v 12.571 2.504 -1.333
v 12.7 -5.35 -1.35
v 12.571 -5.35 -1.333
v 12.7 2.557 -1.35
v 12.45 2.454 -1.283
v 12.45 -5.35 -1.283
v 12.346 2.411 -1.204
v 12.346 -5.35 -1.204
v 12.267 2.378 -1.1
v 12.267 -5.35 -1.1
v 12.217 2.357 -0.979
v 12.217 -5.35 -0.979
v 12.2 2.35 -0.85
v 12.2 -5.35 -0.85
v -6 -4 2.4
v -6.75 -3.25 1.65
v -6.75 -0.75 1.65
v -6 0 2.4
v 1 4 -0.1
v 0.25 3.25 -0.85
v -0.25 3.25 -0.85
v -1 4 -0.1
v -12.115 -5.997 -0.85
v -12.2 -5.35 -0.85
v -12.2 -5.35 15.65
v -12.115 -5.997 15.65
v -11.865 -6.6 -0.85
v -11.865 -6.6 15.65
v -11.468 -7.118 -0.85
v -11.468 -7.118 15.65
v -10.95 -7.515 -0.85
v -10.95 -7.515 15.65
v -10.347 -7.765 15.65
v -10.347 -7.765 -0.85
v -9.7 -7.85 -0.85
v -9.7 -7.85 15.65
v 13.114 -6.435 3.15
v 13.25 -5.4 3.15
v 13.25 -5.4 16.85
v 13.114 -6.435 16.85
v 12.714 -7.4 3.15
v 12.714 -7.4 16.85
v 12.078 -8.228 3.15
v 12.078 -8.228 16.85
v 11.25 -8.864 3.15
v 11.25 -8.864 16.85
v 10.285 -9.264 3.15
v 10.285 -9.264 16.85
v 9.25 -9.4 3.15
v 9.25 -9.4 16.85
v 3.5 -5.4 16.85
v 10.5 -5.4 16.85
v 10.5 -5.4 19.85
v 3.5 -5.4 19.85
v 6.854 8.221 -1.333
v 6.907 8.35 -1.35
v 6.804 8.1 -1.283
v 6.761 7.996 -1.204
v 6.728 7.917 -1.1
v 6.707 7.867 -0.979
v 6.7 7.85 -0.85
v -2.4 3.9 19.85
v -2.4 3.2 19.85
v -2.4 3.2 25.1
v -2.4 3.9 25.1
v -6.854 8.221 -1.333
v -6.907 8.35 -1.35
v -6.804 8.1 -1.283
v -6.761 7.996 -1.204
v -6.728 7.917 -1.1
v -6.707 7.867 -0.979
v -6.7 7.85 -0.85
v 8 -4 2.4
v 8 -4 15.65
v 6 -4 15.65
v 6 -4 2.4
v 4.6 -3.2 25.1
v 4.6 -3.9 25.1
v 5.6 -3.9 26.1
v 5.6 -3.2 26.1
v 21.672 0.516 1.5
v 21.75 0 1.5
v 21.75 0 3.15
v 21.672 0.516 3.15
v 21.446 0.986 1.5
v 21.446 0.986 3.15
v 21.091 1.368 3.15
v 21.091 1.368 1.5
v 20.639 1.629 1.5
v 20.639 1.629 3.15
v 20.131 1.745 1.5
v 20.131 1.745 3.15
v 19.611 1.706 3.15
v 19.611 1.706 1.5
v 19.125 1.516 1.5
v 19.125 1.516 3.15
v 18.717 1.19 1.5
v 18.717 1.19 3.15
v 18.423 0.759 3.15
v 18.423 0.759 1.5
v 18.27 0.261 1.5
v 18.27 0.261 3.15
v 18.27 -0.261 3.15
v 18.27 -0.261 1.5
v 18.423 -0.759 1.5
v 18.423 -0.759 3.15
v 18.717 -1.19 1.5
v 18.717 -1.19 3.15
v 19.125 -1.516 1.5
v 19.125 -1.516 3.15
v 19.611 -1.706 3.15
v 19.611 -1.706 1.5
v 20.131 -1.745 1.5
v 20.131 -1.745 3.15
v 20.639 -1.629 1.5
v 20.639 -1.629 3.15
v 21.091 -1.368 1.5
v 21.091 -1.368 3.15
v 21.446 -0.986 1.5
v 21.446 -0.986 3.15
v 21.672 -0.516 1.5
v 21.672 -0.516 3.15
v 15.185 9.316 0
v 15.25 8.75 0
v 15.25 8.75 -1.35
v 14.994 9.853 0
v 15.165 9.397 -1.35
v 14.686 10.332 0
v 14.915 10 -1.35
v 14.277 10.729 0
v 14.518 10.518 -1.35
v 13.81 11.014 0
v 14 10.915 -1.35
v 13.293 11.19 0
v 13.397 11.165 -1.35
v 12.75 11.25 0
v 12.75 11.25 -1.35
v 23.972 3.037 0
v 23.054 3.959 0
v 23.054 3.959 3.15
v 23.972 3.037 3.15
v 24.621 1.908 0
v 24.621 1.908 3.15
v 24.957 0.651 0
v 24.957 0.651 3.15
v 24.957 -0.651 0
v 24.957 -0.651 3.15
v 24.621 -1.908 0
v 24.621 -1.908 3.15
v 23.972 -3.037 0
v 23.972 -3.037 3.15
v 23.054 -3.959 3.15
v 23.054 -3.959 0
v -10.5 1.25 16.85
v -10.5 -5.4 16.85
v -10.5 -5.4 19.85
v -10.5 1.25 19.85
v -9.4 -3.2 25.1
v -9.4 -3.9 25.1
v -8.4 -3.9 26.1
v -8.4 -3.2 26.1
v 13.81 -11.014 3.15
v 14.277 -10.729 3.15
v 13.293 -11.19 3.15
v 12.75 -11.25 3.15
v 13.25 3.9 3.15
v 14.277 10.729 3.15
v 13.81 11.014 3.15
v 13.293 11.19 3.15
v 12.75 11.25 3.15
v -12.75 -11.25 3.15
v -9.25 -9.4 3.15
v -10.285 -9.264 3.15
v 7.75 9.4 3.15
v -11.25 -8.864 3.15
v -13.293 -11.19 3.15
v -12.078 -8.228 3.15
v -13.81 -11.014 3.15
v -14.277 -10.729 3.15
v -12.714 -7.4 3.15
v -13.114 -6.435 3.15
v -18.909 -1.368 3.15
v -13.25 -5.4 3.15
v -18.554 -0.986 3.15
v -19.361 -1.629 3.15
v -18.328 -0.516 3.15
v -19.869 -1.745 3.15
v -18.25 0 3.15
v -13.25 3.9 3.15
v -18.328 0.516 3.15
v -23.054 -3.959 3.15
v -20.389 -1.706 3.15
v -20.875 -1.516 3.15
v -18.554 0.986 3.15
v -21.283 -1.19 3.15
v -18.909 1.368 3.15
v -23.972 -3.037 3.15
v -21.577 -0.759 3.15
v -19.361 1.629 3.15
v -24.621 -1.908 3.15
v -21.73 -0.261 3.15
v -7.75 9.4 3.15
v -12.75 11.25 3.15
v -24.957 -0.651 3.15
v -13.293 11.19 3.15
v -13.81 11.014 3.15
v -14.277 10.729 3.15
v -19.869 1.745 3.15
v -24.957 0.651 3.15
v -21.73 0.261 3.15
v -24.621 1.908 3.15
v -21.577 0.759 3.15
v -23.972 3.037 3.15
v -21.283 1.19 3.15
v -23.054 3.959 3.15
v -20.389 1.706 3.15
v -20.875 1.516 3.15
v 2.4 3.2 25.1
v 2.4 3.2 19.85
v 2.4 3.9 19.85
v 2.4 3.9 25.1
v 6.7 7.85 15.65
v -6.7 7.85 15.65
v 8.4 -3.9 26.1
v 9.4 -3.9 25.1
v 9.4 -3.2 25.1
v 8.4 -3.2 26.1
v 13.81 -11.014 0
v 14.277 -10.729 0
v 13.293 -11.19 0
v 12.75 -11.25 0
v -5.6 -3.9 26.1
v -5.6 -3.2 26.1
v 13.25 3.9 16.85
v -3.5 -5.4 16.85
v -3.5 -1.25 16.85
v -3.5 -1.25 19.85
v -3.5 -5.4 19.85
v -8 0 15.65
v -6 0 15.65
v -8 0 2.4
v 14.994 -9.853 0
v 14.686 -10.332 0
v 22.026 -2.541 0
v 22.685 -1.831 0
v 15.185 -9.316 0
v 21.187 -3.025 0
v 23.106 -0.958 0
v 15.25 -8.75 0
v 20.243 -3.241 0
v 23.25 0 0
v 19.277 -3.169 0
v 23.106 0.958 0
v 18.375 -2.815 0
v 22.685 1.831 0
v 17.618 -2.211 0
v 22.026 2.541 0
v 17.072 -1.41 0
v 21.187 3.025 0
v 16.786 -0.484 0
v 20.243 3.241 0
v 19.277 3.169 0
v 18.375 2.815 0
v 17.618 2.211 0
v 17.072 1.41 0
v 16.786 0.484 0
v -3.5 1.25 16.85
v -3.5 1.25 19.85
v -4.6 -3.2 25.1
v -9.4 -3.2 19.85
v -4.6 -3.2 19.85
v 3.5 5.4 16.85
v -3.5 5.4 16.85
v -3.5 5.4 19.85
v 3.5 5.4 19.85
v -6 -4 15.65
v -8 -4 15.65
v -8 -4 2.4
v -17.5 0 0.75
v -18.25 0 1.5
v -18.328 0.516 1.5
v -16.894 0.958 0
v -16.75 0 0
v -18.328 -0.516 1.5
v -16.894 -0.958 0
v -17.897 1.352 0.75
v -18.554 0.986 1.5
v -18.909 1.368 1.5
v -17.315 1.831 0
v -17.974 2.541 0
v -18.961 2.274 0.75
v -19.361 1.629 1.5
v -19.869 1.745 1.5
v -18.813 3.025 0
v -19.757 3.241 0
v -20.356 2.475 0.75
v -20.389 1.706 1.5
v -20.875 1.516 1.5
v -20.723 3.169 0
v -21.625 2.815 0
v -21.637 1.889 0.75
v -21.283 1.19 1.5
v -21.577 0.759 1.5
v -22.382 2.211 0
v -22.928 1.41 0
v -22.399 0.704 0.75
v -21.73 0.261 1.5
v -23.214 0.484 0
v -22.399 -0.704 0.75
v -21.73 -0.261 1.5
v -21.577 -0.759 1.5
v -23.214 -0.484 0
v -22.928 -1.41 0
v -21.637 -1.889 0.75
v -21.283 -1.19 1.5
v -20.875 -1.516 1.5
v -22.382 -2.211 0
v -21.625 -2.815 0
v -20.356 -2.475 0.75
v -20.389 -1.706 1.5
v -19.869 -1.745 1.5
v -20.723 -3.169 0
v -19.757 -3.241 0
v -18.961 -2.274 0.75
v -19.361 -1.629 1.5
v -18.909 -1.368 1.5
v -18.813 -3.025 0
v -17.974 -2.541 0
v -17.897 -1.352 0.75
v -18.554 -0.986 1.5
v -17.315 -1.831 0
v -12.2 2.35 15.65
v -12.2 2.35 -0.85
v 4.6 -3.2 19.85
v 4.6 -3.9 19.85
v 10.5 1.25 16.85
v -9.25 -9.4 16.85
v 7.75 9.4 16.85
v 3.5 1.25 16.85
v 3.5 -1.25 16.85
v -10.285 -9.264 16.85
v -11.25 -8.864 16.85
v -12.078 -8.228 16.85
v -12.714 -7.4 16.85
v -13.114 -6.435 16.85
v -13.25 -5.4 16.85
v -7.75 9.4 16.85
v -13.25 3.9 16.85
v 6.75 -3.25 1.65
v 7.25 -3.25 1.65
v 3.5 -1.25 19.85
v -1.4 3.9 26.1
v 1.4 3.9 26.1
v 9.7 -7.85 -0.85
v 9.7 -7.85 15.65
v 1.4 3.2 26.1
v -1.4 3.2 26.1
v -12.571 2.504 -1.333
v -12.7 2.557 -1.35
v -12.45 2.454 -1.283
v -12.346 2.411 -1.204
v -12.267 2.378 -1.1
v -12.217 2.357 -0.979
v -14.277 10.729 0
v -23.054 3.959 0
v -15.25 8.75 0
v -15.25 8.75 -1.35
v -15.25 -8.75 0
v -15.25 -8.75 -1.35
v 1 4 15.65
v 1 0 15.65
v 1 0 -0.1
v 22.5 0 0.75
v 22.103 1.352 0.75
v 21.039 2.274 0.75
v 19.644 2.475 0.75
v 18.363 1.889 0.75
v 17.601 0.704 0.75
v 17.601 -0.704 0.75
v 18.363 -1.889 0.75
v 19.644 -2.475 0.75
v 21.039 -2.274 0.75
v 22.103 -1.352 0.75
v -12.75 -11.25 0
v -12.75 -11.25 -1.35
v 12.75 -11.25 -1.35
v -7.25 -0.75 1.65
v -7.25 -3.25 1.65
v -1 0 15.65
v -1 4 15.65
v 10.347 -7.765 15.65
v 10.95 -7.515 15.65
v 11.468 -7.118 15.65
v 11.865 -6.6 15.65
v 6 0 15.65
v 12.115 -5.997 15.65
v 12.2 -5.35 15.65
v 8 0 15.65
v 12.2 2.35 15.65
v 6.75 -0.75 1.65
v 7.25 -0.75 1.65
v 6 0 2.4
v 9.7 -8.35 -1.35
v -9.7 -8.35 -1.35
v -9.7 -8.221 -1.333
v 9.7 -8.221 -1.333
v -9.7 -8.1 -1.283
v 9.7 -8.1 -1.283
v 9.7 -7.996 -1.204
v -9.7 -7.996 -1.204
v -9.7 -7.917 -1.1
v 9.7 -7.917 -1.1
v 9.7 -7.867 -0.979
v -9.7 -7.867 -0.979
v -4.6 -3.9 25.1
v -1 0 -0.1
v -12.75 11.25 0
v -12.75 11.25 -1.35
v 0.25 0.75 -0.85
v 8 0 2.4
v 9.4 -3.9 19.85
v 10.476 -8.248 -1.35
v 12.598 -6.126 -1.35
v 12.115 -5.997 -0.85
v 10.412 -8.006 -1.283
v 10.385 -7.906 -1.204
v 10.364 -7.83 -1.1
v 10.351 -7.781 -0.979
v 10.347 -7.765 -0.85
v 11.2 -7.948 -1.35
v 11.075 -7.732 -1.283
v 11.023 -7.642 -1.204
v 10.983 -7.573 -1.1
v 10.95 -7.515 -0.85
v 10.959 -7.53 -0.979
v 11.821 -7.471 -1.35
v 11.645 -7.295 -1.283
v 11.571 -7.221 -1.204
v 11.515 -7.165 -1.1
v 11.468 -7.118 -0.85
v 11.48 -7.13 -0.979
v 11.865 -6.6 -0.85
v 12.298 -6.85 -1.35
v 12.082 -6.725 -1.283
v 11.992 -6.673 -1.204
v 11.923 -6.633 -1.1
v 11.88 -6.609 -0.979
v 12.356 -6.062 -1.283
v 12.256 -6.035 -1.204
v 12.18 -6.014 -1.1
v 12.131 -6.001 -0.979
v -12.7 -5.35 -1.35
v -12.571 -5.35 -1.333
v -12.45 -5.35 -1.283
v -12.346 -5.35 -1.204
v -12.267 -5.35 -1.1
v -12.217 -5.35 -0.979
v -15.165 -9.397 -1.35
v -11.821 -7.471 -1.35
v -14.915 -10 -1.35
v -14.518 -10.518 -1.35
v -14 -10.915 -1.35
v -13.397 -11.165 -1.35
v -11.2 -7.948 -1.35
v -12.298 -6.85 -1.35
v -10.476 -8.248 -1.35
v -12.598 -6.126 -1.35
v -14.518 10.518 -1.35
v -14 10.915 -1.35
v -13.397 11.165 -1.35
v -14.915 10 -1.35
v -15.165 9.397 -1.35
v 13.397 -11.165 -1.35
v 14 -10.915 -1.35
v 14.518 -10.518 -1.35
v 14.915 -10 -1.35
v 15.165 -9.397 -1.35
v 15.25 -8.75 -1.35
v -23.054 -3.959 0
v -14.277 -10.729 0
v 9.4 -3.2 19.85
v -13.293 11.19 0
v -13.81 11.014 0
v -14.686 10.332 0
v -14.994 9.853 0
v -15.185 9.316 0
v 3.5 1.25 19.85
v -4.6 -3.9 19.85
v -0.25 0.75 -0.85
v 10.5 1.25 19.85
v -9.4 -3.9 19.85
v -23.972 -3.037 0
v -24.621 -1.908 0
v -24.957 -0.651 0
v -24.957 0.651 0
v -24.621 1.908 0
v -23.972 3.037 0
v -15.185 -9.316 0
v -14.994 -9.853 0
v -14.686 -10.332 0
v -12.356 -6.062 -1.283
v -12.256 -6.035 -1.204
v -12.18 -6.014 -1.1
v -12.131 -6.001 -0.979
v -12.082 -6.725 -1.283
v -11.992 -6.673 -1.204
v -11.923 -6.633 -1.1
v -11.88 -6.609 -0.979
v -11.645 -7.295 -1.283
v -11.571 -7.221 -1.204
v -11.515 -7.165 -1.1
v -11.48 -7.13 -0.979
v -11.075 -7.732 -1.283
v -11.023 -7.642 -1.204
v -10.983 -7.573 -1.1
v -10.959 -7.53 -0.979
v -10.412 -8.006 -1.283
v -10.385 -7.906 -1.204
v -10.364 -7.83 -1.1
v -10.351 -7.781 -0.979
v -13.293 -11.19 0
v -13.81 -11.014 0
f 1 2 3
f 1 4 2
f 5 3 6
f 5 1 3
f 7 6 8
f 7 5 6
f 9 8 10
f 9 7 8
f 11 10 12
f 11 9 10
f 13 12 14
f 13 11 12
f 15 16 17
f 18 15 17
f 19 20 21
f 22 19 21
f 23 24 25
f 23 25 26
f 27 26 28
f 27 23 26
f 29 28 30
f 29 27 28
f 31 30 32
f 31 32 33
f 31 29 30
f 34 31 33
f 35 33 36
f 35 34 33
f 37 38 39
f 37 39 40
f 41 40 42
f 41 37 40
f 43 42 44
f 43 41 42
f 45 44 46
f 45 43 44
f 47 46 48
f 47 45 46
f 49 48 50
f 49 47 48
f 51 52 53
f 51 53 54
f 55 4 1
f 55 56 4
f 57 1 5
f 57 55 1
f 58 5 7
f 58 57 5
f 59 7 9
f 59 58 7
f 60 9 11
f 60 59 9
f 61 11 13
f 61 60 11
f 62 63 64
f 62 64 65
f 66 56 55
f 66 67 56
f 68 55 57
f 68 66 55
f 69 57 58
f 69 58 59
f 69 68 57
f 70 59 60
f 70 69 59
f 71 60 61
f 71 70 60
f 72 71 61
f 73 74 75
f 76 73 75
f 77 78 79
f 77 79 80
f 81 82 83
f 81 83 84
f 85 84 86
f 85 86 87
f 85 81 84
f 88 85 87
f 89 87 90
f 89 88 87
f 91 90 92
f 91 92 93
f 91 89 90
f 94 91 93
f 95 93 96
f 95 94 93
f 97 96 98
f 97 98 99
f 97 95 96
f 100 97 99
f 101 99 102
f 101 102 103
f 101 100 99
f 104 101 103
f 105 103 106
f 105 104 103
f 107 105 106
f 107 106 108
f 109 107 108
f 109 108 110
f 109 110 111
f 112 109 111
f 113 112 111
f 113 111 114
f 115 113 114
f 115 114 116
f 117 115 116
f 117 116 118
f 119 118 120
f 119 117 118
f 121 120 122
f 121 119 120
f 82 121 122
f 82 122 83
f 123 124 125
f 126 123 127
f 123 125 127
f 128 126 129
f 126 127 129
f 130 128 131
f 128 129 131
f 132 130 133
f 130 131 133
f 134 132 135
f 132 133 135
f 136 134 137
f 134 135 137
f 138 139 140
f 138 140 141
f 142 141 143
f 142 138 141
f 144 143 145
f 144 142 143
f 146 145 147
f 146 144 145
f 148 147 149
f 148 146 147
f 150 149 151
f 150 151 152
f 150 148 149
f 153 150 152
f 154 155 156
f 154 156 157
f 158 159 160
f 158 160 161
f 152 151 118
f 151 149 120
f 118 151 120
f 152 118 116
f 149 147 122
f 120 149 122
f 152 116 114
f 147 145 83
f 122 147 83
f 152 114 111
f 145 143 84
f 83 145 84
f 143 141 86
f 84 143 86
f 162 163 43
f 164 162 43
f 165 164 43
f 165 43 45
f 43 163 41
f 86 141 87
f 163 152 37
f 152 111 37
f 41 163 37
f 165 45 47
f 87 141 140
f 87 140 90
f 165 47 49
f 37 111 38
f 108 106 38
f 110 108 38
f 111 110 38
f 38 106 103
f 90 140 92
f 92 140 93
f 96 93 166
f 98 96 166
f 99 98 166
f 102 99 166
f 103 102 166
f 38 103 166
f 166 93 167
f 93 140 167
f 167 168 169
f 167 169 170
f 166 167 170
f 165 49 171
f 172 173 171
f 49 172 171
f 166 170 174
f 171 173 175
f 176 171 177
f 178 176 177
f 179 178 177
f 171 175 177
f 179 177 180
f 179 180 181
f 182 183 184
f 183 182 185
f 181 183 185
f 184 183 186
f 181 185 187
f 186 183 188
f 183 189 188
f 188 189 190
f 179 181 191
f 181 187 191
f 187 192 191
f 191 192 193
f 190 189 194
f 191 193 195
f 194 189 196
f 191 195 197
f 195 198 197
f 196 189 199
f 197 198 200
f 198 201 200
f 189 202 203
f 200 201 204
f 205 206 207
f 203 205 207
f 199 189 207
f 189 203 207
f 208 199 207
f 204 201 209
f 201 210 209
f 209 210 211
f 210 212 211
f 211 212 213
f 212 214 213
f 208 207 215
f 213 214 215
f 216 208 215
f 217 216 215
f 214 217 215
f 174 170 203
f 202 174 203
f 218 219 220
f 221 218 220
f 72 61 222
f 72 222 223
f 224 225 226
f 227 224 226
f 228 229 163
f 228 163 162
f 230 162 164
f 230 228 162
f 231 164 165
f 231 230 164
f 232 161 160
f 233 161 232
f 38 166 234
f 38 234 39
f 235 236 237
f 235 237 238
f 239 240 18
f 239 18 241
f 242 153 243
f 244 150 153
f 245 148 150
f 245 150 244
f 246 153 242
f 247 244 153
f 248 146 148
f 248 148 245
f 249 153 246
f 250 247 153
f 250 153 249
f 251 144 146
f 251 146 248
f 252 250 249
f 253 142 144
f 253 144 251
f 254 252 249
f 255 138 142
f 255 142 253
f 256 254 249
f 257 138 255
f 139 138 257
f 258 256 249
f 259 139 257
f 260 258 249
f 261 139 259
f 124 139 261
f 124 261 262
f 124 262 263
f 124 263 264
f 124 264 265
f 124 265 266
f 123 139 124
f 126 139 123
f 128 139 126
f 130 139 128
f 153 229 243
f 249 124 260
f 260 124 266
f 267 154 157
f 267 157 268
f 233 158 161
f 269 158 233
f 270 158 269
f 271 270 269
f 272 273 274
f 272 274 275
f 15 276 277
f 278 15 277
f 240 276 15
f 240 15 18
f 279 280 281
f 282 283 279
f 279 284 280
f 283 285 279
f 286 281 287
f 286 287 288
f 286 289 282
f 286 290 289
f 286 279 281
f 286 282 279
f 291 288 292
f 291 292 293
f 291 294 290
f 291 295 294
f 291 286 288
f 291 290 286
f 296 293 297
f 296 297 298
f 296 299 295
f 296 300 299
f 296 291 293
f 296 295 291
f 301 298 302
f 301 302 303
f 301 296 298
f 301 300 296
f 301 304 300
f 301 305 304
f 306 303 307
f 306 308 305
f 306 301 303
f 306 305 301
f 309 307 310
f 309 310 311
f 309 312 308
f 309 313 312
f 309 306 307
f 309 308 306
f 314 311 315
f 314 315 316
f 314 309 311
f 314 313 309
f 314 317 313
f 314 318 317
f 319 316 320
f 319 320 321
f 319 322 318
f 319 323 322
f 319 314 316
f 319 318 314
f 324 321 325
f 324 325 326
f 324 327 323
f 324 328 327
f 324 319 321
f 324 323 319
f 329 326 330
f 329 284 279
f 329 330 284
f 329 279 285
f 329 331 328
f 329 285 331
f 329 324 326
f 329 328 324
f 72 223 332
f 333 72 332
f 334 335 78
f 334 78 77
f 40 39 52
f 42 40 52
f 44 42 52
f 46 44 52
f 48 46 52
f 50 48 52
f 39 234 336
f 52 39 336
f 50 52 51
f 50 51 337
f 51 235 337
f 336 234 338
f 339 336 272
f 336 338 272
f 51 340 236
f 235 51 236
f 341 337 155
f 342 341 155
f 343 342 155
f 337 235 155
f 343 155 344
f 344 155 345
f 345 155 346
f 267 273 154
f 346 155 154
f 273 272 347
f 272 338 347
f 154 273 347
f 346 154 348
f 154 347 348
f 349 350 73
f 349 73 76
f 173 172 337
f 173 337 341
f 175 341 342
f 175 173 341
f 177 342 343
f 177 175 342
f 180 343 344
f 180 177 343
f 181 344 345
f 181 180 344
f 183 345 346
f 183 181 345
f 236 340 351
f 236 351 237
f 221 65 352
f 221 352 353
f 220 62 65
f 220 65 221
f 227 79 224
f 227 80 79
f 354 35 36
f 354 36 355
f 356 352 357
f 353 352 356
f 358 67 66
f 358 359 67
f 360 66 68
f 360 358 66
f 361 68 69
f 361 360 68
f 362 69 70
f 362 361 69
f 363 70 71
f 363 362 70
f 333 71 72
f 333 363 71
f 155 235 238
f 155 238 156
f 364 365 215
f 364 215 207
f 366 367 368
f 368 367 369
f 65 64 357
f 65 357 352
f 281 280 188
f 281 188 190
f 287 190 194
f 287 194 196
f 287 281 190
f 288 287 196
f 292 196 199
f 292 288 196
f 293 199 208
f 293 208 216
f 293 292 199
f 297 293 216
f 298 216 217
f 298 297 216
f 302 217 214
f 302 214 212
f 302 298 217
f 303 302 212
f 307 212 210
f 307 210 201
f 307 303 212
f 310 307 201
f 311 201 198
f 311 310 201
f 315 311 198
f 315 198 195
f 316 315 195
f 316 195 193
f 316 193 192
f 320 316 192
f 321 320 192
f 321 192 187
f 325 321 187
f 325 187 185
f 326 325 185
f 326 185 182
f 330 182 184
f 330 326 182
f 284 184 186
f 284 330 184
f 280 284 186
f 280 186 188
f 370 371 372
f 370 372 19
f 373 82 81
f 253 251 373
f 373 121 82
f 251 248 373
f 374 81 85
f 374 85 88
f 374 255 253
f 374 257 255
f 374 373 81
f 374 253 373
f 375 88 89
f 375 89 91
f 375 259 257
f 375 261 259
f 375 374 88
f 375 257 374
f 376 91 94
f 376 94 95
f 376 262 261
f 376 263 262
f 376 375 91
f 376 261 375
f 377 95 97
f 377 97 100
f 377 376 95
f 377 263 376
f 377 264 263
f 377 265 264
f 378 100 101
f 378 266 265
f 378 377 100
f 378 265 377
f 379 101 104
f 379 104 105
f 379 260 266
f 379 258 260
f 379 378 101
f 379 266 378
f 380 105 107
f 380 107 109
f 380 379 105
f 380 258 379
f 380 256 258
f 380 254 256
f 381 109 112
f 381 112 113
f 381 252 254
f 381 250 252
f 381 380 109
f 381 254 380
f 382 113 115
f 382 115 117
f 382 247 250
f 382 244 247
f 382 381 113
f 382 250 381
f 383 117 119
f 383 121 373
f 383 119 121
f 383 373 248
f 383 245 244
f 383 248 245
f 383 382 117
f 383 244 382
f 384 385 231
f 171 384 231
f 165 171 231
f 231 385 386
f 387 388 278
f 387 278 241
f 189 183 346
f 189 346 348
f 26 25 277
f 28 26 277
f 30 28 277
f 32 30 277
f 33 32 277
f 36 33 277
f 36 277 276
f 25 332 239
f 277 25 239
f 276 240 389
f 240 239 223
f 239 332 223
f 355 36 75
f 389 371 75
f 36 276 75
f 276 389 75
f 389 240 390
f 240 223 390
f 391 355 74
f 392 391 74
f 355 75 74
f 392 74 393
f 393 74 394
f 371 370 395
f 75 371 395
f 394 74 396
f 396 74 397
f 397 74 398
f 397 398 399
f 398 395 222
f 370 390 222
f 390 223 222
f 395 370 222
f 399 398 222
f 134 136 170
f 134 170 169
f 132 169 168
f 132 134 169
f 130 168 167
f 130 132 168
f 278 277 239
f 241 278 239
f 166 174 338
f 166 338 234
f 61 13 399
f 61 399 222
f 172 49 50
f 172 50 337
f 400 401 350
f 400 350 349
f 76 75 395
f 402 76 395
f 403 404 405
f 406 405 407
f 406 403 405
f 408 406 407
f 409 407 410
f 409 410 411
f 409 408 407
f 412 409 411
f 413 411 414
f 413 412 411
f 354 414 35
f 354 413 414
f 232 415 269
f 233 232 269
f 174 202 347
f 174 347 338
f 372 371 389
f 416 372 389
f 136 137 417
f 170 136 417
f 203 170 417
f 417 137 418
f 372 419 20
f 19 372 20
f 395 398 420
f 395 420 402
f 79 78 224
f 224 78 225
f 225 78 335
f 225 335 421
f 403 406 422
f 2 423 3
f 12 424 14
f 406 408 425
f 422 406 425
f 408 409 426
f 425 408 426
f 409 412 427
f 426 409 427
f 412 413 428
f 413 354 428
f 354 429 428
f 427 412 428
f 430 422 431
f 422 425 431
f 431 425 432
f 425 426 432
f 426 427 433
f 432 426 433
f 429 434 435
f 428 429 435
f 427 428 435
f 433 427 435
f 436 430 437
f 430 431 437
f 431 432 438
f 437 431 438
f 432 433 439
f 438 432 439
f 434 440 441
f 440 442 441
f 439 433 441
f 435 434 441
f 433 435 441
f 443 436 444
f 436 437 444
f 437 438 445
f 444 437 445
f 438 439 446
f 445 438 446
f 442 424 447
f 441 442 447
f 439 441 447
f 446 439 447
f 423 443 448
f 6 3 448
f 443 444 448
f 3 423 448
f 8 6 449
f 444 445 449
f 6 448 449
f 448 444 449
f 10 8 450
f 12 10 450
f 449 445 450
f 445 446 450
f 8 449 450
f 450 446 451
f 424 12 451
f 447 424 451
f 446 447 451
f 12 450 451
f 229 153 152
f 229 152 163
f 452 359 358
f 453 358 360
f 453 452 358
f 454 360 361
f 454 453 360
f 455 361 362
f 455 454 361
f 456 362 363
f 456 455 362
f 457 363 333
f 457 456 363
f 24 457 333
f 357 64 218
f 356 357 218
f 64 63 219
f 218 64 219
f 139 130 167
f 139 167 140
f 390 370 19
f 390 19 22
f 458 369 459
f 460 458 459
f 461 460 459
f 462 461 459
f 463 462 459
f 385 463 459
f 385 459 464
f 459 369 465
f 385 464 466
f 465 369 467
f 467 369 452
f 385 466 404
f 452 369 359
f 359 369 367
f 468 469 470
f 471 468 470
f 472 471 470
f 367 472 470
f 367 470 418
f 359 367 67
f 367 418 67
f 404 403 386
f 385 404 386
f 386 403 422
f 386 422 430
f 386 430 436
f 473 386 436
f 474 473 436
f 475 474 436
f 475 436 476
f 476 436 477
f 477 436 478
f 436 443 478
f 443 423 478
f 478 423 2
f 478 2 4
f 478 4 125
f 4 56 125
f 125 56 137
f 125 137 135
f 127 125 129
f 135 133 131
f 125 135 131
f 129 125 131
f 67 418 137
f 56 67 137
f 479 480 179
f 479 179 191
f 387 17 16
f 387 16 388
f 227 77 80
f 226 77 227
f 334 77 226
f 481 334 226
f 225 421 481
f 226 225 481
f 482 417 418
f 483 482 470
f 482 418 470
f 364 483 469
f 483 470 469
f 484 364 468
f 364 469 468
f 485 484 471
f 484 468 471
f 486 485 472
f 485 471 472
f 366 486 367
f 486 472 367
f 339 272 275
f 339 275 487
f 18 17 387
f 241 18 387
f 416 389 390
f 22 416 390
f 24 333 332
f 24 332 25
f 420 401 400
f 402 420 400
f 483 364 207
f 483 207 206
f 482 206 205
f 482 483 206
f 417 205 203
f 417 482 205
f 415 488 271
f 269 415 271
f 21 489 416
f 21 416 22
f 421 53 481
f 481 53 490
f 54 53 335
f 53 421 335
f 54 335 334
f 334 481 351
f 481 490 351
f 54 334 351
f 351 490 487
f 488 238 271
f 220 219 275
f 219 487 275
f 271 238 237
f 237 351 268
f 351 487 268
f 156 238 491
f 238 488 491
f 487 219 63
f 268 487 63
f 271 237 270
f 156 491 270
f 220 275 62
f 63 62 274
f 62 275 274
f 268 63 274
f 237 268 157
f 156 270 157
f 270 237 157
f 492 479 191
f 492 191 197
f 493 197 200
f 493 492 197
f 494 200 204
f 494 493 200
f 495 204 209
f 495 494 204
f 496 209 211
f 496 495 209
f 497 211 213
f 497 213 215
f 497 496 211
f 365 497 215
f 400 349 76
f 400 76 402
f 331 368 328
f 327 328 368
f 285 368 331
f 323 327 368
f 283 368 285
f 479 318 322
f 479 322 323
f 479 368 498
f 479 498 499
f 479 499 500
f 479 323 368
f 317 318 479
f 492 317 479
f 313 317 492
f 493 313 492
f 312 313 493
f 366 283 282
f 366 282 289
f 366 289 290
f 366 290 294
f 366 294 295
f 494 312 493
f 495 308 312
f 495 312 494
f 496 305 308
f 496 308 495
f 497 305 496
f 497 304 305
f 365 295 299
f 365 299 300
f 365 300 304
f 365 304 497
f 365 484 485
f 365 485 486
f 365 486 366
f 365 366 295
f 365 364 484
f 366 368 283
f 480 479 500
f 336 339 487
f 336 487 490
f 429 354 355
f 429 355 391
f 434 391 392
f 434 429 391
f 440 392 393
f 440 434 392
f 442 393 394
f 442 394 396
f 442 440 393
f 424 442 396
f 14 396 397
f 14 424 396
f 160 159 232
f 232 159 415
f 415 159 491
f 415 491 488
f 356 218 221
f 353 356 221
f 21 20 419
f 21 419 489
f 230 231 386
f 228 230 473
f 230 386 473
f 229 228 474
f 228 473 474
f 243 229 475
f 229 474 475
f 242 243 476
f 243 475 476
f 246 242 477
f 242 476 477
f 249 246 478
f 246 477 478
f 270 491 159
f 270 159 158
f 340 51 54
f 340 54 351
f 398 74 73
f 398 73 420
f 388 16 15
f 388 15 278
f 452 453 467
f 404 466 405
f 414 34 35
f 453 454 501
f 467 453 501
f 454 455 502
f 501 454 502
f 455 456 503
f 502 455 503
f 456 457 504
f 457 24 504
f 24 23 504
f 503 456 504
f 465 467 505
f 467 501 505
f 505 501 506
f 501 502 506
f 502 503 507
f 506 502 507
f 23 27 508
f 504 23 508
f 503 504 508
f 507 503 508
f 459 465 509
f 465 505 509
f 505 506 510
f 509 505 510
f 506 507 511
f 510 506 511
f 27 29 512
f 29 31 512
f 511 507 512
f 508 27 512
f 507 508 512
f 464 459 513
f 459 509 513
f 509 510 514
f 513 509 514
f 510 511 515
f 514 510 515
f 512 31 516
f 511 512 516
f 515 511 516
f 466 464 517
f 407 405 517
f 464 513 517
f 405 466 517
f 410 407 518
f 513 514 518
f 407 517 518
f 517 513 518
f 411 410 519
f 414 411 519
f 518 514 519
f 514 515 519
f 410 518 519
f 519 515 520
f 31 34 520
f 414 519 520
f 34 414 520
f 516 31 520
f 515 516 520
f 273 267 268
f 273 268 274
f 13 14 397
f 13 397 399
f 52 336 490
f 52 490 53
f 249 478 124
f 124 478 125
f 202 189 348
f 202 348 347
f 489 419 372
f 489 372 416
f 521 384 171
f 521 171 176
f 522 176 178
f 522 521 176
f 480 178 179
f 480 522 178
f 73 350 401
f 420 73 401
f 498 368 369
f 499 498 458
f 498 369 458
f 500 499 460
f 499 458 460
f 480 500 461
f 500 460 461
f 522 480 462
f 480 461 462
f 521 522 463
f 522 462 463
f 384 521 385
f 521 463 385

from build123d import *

# Parameters (mm, degrees)
SKETCH1_R      = 1.75
EXTRUDE1_DEPTH = 3.15
CHAMFER1_SIZE  = 1.5
EXTRUDE2_START = 1.35
EXTRUDE2_DEPTH = 1.35
EXTRUDE3_DEPTH = 13.7
EXTRUDE4_DEPTH = 3
SKETCH5_W      = 4.8
SKETCH5_H      = 0.7
EXTRUDE5_DEPTH = 6.25
CHAMFER2_SIZE  = 1
EXTRUDE6_DEPTH = 17
FILLET1_R      = 0.5
SKETCH7_W      = 2
SKETCH7_H      = 4
EXTRUDE7_DEPTH = 14
SKETCH8_W      = 2
SKETCH8_H      = 4
EXTRUDE8_DEPTH = 16.5
CHAMFER3_SIZE  = 0.75


with BuildPart() as part:
    # Sketch1 → Extrude1 (new body)
    with BuildSketch(Plane.XY):
        with BuildLine():
            Line((-12.75, 11.25), (12.75, 11.25))
            ThreePointArc((12.75, 11.25), (13.556623081, 11.116296517), (14.276967509, 10.729487365))
            Line((14.276967509, 10.729487365), (23.053935018, 3.958974729))
            ThreePointArc((23.053935018, 3.958974729), (25, 0), (23.053935018, -3.958974729))
            Line((23.053935018, -3.958974729), (14.276967509, -10.729487365))
            ThreePointArc((14.276967509, -10.729487365), (13.556623081, -11.116296517), (12.75, -11.25))
            Line((12.75, -11.25), (-12.75, -11.25))
            ThreePointArc((-12.75, -11.25), (-13.556623081, -11.116296517), (-14.276967509, -10.729487365))
            Line((-14.276967509, -10.729487365), (-23.053935018, -3.958974729))
            ThreePointArc((-23.053935018, -3.958974729), (-25, 0), (-23.053935018, 3.958974729))
            Line((-23.053935018, 3.958974729), (-14.276967509, 10.729487365))
            ThreePointArc((-14.276967509, 10.729487365), (-13.556623081, 11.116296517), (-12.75, 11.25))
        make_face()
        with Locations((-20, 0)):
            Circle(SKETCH1_R, mode=Mode.SUBTRACT)
        with Locations((20, 0)):
            Circle(SKETCH1_R, mode=Mode.SUBTRACT)
    extrude(amount=EXTRUDE1_DEPTH)

    # Chamfer1
    chamfer1_edges = [part.edges().sort_by_distance(p)[0] for p in [
        (-21.75, 0, 0),
        (18.25, 0, 0),
    ]]
    chamfer(chamfer1_edges, length=CHAMFER1_SIZE)

    # Sketch2 → Extrude2 (add)
    with BuildSketch(Plane(origin=(0, 0, 0), x_dir=(-1, 0, 0), z_dir=(0, 0, -1)).offset(EXTRUDE2_START)):
        with BuildLine():
            Line((-12.75, 11.25), (12.75, 11.25))
            ThreePointArc((12.75, 11.25), (14.517766953, 10.517766953), (15.25, 8.75))
            Line((15.25, 8.75), (15.25, -8.75))
            ThreePointArc((15.25, -8.75), (14.517766953, -10.517766953), (12.75, -11.25))
            Line((12.75, -11.25), (-12.75, -11.25))
            ThreePointArc((-12.75, -11.25), (-14.517766953, -10.517766953), (-15.25, -8.75))
            Line((-15.25, -8.75), (-15.25, 8.75))
            ThreePointArc((-15.25, 8.75), (-14.517766953, 10.517766953), (-12.75, 11.25))
        make_face()
    extrude(amount=-EXTRUDE2_DEPTH)

    # Sketch3 → Extrude3 (add)
    with BuildSketch(Plane.XY.offset(3.15)):
        with BuildLine():
            Line((-7.75, 9.4), (7.75, 9.4))
            Line((7.75, 9.4), (13.25, 3.9))
            Line((13.25, 3.9), (13.25, -5.4))
            ThreePointArc((13.25, -5.4), (12.078427125, -8.228427125), (9.25, -9.4))
            Line((9.25, -9.4), (-9.25, -9.4))
            ThreePointArc((-9.25, -9.4), (-12.078427125, -8.228427125), (-13.25, -5.4))
            Line((-13.25, -5.4), (-13.25, 3.9))
            Line((-13.25, 3.9), (-7.75, 9.4))
        make_face()
    extrude(amount=EXTRUDE3_DEPTH)

    # Sketch4 → Extrude4 (add)
    with BuildSketch(Plane.XY.offset(16.85)):
        Polygon((-10.5, 1.25), (-3.5, 1.25), (-3.5, 5.4), (3.5, 5.4), (3.5, 1.25), (10.5, 1.25), (10.5, -5.4), (3.5, -5.4), (3.5, -1.25), (-3.5, -1.25), (-3.5, -5.4), (-10.5, -5.4), align=None)
    extrude(amount=EXTRUDE4_DEPTH)

    # Sketch5 → Extrude5 (add)
    with BuildSketch(Plane.XY.offset(19.85)):
        with Locations((0, 3.55)):
            Rectangle(SKETCH5_W, SKETCH5_H)
        with Locations((7, -3.55)):
            Rectangle(SKETCH5_W, SKETCH5_H)
        with Locations((-7, -3.55)):
            Rectangle(SKETCH5_W, SKETCH5_H)
    extrude(amount=EXTRUDE5_DEPTH)

    # Chamfer2
    chamfer2_edges = [part.edges().sort_by_distance(p)[0] for p in [
        (-2.4, 3.55, 26.1),
        (2.4, 3.55, 26.1),
        (4.6, -3.55, 26.1),
        (9.4, -3.55, 26.1),
        (-9.4, -3.55, 26.1),
        (-4.6, -3.55, 26.1),
    ]]
    chamfer(chamfer2_edges, length=CHAMFER2_SIZE)

    # Sketch6 → Extrude6 (cut)
    with BuildSketch(Plane(origin=(0, 0, -1.35), x_dir=(-1, 0, 0), z_dir=(0, 0, -1))):
        with BuildLine():
            Line((-6.7, 7.85), (6.7, 7.85))
            Line((6.7, 7.85), (12.2, 2.35))
            Line((12.2, 2.35), (12.2, -5.35))
            ThreePointArc((12.2, -5.35), (11.467766953, -7.117766953), (9.7, -7.85))
            Line((9.7, -7.85), (-9.7, -7.85))
            ThreePointArc((-9.7, -7.85), (-11.467766953, -7.117766953), (-12.2, -5.35))
            Line((-12.2, -5.35), (-12.2, 2.35))
            Line((-12.2, 2.35), (-6.7, 7.85))
        make_face()
    extrude(amount=-EXTRUDE6_DEPTH, mode=Mode.SUBTRACT)

    # Fillet1
    fillet1_edges = [part.edges().sort_by_distance(p)[0] for p in [
        (9.45, 5.1, -1.35),
        (12.2, -1.5, -1.35),
        (11.467766953, -7.117766953, -1.35),
        (0, -7.85, -1.35),
        (-11.467766953, -7.117766953, -1.35),
        (-12.2, -1.5, -1.35),
        (-9.45, 5.1, -1.35),
        (0, 7.85, -1.35),
    ]]
    fillet(fillet1_edges, radius=FILLET1_R)

    # Sketch7 → Extrude7 (add)
    with BuildSketch(Plane(origin=(0, 0, 15.65), x_dir=(-1, 0, 0), z_dir=(0, 0, -1))):
        with Locations((-7, -2)):
            Rectangle(SKETCH7_W, SKETCH7_H)
        with Locations((7, -2)):
            Rectangle(SKETCH7_W, SKETCH7_H)
    extrude(amount=EXTRUDE7_DEPTH)

    # Sketch8 → Extrude8 (add)
    with BuildSketch(Plane(origin=(0, 0, 15.65), x_dir=(-1, 0, 0), z_dir=(0, 0, -1))):
        with Locations((0, 2)):
            Rectangle(SKETCH8_W, SKETCH8_H)
    extrude(amount=EXTRUDE8_DEPTH)

    # Chamfer3
    chamfer3_edges = [part.edges().sort_by_distance(p)[0] for p in [
        (8, -2, 1.65),
        (7, -4, 1.65),
        (6, -2, 1.65),
        (7, 0, 1.65),
        (-6, -2, 1.65),
        (-7, -4, 1.65),
        (-8, -2, 1.65),
        (-7, 0, 1.65),
        (1, 2, -0.85),
        (0, 0, -0.85),
        (-1, 2, -0.85),
        (0, 4, -0.85),
    ]]
    chamfer(chamfer3_edges, length=CHAMFER3_SIZE)


solid = part.part
